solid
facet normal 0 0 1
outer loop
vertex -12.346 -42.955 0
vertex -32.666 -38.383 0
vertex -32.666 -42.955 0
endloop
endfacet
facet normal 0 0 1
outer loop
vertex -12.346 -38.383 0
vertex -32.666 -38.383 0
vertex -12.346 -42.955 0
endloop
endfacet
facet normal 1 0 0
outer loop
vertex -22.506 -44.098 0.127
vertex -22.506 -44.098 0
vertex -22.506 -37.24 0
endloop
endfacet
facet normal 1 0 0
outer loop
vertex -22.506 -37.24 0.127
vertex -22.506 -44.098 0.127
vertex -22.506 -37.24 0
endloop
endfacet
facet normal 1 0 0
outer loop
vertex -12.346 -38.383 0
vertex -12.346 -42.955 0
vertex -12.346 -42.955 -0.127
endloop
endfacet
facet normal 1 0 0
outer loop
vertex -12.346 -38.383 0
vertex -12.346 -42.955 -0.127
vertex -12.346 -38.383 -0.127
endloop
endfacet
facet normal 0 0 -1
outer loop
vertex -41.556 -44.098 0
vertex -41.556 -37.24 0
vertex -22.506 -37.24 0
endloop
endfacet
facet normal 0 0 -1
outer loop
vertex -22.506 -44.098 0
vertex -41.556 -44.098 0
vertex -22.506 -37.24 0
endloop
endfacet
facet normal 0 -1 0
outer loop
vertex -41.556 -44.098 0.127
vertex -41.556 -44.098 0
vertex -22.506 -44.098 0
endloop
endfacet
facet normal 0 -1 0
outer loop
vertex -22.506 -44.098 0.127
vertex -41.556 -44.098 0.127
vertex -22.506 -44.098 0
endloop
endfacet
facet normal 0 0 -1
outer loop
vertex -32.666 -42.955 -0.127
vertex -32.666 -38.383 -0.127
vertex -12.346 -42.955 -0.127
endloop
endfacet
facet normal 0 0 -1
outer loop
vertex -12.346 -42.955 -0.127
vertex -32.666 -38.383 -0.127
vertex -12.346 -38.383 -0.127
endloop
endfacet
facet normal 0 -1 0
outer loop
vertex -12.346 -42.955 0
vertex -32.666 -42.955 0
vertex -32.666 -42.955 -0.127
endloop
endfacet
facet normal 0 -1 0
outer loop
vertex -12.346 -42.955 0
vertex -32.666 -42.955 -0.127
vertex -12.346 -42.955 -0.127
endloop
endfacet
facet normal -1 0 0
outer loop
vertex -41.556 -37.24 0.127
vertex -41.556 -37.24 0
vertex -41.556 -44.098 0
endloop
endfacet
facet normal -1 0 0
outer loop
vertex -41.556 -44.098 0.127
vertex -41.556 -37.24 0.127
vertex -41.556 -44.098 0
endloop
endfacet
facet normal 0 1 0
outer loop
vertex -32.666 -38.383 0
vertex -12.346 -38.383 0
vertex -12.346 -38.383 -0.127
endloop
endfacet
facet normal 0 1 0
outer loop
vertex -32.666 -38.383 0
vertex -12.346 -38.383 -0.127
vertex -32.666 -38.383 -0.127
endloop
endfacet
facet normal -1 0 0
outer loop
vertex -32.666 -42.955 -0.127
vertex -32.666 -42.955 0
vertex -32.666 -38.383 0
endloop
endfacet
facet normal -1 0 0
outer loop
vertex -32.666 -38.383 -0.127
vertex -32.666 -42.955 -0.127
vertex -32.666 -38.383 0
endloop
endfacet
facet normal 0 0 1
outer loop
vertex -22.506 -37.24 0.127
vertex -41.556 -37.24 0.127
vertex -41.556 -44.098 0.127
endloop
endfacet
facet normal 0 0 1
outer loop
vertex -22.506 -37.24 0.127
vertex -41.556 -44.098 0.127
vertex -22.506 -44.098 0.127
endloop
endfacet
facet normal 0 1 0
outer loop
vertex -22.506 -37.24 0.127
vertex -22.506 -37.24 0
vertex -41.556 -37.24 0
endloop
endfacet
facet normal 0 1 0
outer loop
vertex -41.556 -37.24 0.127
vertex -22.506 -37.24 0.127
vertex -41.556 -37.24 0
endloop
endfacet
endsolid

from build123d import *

# Parameters (mm, degrees)
F0_W     = 10.16
F0_H     = 4.572
F1_DEPTH = 0.127
F2_DEPTH = 0.127


with BuildPart() as f1:
    # F0 (on Top) → F1 (new body)
    with BuildSketch(Plane.XY):
        Polygon((-22.505581, -37.240201), (-41.555581, -37.240201), (-41.555581, -44.098201), (-22.505581, -44.098201), (-22.505581, -42.955201), (-32.665581, -42.955201), (-32.665581, -38.383201), (-22.505581, -38.383201), align=None)
        with Locations((-27.585581, -40.669201)):
            Rectangle(F0_W, F0_H)
    extrude(amount=F1_DEPTH)


with BuildPart() as f2:
    # F0 (on Top) → F2 (new body)
    with BuildSketch(Plane.XY):
        with Locations((-27.585581, -40.669201)):
            Rectangle(F0_W, F0_H)
        with Locations((-17.425581, -40.669201)):
            Rectangle(F0_W, F0_H)
    extrude(amount=-F2_DEPTH)


solid = Compound([f1.part, f2.part])
